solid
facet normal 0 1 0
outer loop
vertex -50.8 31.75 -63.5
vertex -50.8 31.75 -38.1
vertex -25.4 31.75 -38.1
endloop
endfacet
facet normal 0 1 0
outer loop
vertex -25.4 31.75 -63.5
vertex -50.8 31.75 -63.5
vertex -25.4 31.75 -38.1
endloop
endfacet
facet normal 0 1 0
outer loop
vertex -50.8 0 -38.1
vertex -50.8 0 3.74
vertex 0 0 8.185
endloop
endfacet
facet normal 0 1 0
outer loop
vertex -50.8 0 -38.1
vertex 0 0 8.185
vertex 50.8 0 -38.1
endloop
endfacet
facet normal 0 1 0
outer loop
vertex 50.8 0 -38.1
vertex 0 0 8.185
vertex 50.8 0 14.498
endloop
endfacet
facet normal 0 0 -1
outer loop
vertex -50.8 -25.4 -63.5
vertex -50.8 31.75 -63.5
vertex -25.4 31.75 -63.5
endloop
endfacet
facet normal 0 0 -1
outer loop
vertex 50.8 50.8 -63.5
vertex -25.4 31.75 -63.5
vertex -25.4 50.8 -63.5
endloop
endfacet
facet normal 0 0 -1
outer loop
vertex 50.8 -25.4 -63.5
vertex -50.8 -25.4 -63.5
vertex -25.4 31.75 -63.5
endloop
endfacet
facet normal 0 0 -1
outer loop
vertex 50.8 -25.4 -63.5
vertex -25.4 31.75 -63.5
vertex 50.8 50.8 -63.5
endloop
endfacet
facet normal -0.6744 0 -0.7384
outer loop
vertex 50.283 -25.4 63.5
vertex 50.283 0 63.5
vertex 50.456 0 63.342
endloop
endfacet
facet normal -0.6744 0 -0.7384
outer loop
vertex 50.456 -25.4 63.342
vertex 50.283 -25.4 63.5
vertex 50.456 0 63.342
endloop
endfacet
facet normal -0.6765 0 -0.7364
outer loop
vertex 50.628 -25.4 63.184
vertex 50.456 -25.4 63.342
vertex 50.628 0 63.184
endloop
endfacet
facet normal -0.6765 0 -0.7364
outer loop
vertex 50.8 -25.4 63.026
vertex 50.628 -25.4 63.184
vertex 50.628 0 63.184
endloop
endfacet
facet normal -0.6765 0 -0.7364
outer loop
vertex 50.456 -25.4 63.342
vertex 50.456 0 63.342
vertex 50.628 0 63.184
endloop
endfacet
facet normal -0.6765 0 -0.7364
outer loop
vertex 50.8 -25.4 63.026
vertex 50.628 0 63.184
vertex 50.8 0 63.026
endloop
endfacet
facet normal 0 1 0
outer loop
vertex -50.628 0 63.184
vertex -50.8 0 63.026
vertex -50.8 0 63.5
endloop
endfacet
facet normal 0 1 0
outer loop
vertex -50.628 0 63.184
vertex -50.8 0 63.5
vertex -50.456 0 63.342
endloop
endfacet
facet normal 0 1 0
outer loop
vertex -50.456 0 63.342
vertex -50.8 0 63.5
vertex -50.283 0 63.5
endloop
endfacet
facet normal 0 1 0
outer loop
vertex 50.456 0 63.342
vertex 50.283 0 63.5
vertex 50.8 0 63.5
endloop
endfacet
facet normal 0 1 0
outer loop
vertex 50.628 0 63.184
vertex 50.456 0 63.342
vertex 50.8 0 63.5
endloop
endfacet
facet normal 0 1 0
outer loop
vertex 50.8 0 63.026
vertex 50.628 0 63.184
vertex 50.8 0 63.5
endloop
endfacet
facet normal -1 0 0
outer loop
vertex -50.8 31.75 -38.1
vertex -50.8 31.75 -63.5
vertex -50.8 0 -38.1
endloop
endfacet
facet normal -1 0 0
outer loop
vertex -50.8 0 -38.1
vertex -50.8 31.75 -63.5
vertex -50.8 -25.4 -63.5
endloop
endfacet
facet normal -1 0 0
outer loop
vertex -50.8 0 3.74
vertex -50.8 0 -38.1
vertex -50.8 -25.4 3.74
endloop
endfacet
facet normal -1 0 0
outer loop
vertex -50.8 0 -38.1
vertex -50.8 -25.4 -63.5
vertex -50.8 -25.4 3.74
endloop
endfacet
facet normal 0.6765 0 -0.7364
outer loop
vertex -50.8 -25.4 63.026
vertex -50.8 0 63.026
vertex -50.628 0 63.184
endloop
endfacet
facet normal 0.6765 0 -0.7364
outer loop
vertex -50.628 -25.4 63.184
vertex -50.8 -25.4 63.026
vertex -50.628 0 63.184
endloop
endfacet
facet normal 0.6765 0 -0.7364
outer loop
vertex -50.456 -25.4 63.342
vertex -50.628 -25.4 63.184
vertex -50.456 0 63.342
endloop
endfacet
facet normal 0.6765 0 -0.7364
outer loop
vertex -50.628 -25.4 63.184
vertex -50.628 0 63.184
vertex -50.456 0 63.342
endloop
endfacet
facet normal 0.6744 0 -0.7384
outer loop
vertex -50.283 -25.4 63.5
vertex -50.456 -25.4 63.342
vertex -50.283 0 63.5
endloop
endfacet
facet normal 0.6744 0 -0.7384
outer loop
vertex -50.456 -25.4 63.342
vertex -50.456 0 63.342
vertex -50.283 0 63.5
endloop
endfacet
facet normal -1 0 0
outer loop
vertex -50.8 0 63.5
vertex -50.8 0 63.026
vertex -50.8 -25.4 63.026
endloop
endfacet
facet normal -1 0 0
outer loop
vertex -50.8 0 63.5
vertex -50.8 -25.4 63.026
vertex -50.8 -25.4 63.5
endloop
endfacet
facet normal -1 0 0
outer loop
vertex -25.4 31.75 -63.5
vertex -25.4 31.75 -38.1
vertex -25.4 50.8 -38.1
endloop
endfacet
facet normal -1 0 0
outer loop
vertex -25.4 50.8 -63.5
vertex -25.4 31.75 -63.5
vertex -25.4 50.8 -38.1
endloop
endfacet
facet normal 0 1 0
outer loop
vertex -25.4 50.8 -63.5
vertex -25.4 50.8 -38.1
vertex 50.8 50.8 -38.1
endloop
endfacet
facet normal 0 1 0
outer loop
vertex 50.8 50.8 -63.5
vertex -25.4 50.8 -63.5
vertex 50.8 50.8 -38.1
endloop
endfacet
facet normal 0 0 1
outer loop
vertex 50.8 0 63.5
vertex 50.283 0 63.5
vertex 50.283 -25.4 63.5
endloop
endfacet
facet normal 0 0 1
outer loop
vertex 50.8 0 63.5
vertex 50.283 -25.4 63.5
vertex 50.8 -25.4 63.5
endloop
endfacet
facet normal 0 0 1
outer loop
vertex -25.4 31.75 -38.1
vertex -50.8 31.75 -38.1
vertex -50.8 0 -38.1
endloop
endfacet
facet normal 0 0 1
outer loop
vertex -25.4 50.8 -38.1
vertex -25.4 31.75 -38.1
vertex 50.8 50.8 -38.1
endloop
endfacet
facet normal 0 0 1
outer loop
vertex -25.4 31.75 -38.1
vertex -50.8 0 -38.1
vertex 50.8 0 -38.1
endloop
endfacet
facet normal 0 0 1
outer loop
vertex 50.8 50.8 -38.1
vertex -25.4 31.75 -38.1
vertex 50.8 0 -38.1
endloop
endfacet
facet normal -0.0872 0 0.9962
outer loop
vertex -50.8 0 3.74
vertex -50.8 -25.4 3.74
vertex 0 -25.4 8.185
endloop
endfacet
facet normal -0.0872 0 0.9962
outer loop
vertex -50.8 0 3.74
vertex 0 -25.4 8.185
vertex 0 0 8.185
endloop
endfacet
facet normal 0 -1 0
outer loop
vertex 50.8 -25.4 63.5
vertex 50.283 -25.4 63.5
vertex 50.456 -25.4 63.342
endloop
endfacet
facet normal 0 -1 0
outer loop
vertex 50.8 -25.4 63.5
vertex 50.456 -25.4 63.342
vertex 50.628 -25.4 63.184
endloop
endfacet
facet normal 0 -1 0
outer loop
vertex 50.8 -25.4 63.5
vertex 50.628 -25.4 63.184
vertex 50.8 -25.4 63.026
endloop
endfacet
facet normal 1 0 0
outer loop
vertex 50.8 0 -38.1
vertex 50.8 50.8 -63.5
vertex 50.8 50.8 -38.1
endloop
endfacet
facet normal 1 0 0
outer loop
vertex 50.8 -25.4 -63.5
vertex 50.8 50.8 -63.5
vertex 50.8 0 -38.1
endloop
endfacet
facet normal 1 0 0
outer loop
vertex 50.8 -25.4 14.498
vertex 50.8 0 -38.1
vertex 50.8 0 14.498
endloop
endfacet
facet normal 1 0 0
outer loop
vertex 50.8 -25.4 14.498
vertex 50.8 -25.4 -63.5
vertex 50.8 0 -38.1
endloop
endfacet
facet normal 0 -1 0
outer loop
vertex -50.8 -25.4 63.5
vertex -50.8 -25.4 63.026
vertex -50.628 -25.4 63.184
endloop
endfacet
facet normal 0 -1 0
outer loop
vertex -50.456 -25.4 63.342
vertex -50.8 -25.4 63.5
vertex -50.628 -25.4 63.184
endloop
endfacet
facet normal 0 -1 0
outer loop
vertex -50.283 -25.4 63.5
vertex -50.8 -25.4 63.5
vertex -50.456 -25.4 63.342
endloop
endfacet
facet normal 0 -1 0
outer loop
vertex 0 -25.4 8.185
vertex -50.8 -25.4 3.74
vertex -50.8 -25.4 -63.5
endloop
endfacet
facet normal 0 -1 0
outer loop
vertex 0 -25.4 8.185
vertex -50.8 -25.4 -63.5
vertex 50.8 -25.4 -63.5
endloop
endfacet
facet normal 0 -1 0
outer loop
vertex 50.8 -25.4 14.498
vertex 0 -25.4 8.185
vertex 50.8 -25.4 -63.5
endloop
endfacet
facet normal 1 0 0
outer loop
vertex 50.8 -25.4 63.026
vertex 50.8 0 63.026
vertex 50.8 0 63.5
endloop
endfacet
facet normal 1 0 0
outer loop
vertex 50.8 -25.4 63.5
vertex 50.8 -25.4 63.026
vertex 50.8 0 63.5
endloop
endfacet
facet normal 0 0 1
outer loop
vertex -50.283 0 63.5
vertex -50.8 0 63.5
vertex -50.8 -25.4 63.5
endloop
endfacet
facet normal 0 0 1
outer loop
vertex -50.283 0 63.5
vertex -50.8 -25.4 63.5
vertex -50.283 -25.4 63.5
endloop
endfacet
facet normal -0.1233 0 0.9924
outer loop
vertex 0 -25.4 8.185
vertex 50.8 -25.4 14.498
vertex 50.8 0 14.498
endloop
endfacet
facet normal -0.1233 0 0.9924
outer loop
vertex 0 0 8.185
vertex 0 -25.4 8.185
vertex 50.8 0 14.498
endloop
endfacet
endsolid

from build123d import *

# Parameters (mm, degrees)
F0_W          = 101.6
F0_H          = 25.4
F1_DEPTH      = 63.5
F2_W          = 101.6
F2_H          = 25.4
F3_DEPTH      = 50.8
F4_W          = 25.4
F4_H          = 19.05
F5_DEPTH      = 127
F6_W          = 25.4
F6_H          = 74.7540574521
F7_ANGLE_BACK = 95
F7_ANGLE      = 177.9160204785


with BuildPart() as f1:
    # F0 (on Top) → F1 (new body, symmetric)
    with BuildSketch(Plane.XY):
        with Locations((0, -12.7)):
            Rectangle(F0_W, F0_H)
    extrude(amount=F1_DEPTH, both=True)

    # F2 (on Front) → F3 (join)
    with BuildSketch(Plane.XZ):
        with Locations((0, -50.8)):
            Rectangle(F2_W, F2_H)
    extrude(amount=-F3_DEPTH)

    # F4 (on Top) → F5 (cut)
    with BuildSketch(Plane.XY):
        with Locations((-38.1, 41.275)):
            Rectangle(F4_W, F4_H)
    extrude(amount=-F5_DEPTH, mode=Mode.SUBTRACT)

    # F6 (on Right) → F7 (revolve, cut)
    with BuildSketch(Plane.YZ, mode=Mode.PRIVATE) as f7_sk:
        with Locations((-12.7, 45.561642386)):
            Rectangle(F6_W, F6_H)
    revolve(f7_sk.sketch.rotate(Axis((0, -12.7, 8.18461366), (0, 1, 0)), -F7_ANGLE_BACK), axis=Axis((0, -12.7, 8.18461366), (0, 1, 0)), revolution_arc=F7_ANGLE, mode=Mode.SUBTRACT)


solid = f1.part
